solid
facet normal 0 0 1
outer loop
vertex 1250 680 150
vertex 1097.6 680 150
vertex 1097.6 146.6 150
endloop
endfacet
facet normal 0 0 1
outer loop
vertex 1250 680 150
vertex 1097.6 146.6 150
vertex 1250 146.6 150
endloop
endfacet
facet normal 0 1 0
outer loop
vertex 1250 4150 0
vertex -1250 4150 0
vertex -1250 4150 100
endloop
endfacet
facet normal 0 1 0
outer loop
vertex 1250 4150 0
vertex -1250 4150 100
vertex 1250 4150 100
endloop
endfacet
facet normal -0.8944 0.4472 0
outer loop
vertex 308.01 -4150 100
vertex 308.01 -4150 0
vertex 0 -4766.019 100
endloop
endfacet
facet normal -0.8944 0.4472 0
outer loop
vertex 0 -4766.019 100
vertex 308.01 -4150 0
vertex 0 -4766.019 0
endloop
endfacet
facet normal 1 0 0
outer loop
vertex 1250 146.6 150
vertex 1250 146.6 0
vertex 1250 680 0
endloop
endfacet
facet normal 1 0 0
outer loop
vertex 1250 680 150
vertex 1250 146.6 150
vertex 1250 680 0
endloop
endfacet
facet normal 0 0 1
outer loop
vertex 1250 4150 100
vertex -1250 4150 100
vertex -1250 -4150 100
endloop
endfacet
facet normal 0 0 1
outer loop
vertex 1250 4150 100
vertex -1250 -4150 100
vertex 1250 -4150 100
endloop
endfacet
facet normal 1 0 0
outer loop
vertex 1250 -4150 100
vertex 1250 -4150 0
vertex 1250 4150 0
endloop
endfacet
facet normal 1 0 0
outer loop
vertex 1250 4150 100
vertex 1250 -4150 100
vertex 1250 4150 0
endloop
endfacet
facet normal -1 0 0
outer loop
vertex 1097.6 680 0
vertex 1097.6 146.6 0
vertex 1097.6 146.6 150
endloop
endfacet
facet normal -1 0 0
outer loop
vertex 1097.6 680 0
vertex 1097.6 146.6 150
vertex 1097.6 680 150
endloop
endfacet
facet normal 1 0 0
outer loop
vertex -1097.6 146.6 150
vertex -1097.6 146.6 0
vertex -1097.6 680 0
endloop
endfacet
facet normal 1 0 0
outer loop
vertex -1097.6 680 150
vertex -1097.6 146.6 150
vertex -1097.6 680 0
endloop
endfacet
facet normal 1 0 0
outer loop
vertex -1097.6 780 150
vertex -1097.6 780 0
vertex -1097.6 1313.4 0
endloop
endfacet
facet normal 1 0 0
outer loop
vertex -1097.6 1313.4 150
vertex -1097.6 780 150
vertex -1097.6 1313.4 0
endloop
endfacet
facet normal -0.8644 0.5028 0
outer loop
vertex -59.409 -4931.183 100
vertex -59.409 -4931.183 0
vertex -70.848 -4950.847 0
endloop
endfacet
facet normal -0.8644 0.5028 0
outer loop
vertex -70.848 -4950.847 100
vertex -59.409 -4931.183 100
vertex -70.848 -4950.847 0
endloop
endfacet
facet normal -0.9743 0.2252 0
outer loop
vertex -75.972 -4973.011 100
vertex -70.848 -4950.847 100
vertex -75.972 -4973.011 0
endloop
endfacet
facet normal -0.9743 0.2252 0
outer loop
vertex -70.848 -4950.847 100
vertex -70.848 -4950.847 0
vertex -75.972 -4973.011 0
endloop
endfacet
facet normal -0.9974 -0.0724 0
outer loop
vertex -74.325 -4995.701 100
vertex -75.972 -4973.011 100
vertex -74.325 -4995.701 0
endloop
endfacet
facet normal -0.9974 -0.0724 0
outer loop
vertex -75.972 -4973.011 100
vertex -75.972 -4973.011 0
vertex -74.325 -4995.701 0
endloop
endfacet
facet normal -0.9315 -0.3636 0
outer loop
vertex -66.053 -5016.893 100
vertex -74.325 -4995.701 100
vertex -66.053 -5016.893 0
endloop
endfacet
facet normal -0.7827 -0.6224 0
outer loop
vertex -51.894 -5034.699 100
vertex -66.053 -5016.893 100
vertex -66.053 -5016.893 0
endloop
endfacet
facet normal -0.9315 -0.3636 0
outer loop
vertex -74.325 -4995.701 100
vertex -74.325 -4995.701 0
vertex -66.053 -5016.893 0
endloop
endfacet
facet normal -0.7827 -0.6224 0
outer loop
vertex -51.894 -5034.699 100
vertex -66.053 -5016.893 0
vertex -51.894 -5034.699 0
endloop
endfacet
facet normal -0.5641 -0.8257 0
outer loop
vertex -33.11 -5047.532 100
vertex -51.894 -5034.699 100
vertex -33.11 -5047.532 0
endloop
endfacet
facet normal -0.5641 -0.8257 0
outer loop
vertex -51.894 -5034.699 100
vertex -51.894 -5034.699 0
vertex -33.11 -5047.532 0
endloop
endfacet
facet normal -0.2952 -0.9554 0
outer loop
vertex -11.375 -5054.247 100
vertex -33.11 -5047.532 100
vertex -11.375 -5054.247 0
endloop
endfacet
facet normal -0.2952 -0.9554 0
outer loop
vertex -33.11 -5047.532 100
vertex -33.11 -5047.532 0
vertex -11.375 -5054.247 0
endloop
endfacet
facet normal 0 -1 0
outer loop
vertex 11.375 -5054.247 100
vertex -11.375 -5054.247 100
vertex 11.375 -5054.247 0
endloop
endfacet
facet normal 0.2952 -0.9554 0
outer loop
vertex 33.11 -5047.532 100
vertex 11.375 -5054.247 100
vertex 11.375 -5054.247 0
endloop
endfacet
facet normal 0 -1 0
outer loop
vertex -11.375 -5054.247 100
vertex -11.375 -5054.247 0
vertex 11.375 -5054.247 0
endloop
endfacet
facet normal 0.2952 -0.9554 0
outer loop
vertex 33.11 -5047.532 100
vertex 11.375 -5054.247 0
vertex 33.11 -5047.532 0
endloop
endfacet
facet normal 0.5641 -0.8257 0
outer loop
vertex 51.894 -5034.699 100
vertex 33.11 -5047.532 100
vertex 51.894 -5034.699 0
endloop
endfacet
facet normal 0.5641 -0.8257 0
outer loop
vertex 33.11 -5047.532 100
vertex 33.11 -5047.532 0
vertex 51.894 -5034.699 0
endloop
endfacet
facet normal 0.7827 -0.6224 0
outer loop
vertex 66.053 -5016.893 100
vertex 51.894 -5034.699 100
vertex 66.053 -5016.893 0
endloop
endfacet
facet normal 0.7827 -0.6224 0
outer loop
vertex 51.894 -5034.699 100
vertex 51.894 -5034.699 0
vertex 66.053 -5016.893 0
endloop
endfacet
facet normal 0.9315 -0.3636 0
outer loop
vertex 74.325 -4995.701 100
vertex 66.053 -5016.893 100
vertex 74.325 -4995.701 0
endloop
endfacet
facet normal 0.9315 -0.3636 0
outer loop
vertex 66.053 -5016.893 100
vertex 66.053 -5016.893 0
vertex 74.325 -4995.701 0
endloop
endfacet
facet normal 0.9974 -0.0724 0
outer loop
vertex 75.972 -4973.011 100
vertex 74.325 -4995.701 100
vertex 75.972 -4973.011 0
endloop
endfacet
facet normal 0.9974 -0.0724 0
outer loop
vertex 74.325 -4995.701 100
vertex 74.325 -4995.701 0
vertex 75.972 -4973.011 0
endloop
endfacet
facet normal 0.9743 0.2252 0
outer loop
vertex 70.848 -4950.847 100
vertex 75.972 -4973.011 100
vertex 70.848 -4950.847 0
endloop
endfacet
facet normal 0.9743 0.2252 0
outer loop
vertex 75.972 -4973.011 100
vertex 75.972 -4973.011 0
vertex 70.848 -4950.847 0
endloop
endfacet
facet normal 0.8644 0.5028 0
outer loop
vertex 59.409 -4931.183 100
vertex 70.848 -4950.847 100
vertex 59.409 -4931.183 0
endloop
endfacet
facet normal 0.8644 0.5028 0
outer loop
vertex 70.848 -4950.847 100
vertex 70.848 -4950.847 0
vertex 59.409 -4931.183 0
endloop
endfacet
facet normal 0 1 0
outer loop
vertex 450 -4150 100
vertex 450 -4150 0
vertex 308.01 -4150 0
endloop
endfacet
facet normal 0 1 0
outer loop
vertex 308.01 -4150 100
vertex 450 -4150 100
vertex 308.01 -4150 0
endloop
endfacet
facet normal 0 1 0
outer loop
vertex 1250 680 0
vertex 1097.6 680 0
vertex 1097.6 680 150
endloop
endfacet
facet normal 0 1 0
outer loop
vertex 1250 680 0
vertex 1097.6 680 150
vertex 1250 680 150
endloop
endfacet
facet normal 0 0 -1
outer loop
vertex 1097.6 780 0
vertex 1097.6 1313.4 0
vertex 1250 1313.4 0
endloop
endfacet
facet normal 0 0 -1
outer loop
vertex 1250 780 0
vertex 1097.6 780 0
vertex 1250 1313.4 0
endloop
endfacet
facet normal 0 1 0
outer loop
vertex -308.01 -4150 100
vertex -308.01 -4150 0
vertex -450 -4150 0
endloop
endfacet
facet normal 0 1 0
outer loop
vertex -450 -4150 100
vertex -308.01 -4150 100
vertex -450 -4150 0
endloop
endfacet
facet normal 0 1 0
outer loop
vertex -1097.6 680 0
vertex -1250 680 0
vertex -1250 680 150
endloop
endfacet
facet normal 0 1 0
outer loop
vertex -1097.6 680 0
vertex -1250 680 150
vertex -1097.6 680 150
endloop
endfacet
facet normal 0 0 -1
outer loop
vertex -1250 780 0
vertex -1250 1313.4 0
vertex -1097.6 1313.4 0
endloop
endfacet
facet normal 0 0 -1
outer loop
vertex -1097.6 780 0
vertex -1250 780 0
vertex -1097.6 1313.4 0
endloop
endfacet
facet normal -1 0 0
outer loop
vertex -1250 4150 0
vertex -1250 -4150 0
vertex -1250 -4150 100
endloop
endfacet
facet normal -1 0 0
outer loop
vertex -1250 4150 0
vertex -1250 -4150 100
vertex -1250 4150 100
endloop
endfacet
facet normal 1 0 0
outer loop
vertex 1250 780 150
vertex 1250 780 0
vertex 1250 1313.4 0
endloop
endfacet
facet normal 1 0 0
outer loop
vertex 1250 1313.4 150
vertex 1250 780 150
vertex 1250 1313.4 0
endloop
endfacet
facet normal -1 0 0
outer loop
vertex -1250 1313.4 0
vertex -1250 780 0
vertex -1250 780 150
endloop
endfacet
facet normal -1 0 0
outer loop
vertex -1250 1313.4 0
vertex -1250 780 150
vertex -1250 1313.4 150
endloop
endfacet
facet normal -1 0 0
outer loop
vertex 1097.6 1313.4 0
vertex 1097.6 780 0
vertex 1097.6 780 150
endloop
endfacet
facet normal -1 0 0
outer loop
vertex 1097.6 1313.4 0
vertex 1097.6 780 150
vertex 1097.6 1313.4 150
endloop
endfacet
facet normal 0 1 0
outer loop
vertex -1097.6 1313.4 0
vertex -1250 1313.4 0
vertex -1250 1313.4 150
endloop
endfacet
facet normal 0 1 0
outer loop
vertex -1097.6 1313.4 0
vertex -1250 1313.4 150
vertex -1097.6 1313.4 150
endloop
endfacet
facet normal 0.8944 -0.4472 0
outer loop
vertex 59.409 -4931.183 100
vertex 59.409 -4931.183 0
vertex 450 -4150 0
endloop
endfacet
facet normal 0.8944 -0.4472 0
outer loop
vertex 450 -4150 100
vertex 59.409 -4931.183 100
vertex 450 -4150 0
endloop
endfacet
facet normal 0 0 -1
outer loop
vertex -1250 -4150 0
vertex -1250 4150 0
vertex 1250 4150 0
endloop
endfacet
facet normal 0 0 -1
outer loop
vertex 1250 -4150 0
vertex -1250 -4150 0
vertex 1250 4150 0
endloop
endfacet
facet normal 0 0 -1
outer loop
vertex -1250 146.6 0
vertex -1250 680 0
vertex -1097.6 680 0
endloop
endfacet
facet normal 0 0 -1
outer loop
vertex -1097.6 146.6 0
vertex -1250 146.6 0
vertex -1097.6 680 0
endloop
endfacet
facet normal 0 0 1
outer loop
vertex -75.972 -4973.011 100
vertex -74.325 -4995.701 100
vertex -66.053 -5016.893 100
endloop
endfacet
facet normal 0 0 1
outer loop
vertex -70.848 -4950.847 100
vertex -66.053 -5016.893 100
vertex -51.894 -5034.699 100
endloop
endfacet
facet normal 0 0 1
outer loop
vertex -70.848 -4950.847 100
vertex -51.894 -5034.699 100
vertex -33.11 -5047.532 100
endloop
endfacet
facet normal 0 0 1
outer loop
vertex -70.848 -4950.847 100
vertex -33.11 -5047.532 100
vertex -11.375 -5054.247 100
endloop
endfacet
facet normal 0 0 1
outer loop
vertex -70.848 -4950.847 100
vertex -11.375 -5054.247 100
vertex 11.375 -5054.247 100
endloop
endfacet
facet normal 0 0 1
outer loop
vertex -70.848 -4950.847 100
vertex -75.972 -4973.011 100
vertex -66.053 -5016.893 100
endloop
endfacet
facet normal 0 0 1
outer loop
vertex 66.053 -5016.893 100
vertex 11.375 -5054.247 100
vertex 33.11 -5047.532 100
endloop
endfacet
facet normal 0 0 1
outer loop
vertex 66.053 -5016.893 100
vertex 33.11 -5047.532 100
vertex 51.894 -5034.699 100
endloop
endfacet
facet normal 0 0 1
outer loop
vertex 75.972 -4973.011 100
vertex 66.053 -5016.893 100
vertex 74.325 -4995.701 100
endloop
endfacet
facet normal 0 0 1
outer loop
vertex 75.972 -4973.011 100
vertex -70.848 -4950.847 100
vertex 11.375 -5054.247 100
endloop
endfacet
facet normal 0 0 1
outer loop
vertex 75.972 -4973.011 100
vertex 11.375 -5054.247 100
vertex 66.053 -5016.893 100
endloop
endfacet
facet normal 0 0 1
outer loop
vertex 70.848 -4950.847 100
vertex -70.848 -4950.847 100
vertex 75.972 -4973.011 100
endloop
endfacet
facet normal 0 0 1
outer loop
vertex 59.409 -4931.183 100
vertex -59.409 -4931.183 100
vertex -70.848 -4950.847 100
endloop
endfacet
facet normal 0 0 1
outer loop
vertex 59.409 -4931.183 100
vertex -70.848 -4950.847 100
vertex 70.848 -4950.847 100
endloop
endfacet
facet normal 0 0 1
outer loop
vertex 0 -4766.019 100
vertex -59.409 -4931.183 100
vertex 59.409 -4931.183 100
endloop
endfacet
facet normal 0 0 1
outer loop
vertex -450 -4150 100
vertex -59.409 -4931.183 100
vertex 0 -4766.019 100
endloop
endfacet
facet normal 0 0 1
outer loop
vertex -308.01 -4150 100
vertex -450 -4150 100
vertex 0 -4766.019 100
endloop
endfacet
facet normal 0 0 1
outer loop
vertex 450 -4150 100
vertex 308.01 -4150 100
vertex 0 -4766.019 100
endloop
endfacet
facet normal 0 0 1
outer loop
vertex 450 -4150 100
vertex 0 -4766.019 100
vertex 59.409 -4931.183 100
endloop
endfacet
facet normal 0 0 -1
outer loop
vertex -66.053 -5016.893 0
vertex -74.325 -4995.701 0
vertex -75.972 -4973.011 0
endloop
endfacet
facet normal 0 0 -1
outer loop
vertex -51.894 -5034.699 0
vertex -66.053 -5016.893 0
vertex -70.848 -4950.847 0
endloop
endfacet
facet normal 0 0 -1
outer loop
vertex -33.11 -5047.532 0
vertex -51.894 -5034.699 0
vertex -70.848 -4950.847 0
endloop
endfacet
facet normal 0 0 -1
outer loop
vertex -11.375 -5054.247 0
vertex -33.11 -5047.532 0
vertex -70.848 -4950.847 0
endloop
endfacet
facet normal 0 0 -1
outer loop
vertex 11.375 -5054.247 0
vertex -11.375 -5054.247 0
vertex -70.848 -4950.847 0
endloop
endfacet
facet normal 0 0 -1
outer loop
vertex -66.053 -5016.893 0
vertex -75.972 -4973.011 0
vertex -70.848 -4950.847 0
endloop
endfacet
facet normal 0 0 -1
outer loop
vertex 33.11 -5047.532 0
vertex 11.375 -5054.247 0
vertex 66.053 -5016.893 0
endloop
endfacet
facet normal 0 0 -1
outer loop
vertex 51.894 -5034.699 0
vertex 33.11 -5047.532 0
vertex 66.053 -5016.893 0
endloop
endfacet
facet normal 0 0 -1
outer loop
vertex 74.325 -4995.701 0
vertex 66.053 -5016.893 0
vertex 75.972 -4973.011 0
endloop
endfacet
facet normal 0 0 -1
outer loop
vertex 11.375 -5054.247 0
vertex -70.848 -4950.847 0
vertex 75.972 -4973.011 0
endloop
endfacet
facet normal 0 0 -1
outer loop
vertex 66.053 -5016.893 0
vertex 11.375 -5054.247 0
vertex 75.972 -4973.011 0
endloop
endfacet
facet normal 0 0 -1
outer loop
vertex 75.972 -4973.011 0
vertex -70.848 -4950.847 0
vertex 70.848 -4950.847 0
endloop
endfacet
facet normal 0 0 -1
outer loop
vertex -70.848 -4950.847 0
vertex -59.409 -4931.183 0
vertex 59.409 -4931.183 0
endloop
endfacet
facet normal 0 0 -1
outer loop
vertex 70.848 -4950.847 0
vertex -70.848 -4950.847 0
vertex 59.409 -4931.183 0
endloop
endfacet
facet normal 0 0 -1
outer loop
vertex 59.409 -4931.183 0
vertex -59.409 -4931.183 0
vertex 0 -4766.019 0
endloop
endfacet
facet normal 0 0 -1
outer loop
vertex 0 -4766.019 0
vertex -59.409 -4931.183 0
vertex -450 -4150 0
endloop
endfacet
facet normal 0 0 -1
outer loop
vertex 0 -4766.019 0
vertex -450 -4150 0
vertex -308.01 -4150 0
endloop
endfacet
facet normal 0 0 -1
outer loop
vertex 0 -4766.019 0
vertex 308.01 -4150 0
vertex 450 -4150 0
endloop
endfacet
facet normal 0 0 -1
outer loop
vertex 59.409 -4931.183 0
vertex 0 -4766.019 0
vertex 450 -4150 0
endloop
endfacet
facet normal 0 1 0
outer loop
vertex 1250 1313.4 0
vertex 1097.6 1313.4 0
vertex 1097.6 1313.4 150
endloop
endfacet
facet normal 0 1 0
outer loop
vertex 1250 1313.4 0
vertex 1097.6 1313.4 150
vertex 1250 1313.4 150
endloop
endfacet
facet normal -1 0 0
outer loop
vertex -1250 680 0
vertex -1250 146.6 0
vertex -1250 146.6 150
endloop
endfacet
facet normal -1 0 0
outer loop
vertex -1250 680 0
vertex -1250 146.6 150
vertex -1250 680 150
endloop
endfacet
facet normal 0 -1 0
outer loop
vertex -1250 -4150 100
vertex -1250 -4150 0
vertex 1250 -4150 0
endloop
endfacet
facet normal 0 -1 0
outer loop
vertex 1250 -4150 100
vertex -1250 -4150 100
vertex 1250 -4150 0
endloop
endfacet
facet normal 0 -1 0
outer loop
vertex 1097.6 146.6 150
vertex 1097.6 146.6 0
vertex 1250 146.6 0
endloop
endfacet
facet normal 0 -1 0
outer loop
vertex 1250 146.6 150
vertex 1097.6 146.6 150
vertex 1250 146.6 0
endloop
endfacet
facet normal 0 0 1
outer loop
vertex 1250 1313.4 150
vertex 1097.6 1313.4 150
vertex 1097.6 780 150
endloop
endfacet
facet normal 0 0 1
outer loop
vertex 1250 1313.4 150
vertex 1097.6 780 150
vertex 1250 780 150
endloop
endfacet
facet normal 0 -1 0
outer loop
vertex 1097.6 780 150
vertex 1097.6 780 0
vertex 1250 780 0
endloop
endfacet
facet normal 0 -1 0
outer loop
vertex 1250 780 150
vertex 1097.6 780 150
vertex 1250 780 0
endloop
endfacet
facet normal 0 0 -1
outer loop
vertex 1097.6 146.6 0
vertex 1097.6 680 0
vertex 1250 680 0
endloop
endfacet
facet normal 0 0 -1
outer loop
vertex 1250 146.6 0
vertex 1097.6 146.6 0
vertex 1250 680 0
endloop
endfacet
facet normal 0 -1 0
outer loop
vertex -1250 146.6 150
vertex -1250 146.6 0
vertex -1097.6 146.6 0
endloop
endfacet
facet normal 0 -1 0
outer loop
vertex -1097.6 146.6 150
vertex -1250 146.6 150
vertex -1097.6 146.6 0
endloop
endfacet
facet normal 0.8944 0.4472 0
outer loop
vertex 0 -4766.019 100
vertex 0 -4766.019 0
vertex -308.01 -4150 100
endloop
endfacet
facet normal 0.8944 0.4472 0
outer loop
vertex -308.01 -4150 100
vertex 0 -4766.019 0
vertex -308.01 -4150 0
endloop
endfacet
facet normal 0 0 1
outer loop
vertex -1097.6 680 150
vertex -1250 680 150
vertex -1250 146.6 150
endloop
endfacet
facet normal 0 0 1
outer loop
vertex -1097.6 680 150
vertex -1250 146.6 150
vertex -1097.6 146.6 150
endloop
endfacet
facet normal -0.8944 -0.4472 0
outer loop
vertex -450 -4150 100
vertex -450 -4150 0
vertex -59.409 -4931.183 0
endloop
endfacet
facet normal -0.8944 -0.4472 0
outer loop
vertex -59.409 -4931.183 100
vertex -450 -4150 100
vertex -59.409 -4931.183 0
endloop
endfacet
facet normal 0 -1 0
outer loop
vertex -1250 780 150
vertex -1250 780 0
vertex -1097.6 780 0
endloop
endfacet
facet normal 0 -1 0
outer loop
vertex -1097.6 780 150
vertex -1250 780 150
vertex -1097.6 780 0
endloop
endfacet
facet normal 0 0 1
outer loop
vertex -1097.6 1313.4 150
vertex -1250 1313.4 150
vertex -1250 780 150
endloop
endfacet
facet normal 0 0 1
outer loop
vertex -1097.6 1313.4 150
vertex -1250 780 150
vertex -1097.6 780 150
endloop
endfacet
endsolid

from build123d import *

# Parameters (mm, degrees)
F0_W     = 2500
F0_H     = 8300
F1_DEPTH = 100
F3_DEPTH = 100
F4_W     = 152.4
F4_H     = 533.4
F5_DEPTH = 150


with BuildPart() as f1:
    # F0 (on Top) → F1 (new body)
    with BuildSketch(Plane.XY):
        Rectangle(F0_W, F0_H)
    extrude(amount=F1_DEPTH)


with BuildPart() as f3:
    # F2 (on Top) → F3 (new body)
    with BuildSketch(Plane.XY):
        with BuildLine():
            Line((-308.0096834288, -4150), (-450, -4150))
            Line((-450, -4150), (-59.4087300624, -4931.1825398752))
            ThreePointArc((-59.4087300624, -4931.1825398752), (0, -4902.7009094238), (59.4087300624, -4931.1825398752))
            Line((59.4087300624, -4931.1825398752), (450, -4150))
            Line((450, -4150), (308.0096834288, -4150))
            Line((308.0096834288, -4150), (0, -4766.0193668575))
            Line((0, -4766.0193668575), (-308.0096834288, -4150))
        make_face()
        with BuildLine():
            ThreePointArc((59.4087300624, -4931.1825398752), (0, -4902.7009094238), (-59.4087300624, -4931.1825398752))
            Line((-59.4087300624, -4931.1825398752), (0, -5050))
            Line((0, -5050), (59.4087300624, -4931.1825398752))
        make_face()
        with BuildLine():
            Line((0, -5050), (-59.4087300624, -4931.1825398752))
            ThreePointArc((-59.4087300624, -4931.1825398752), (-25.2932280388, -5050.7806187678), (76.2, -4978.9009094238))
            ThreePointArc((76.2, -4978.9009094238), (71.879709344, -4953.607681385), (59.4087300624, -4931.1825398752))
            Line((59.4087300624, -4931.1825398752), (0, -5050))
        make_face()
    extrude(amount=F3_DEPTH)


with BuildPart() as f5:
    # F4 (on Top) → F5 (new body)
    with BuildSketch(Plane.XY):
        with Locations((-1173.8, 1046.7)):
            Rectangle(F4_W, F4_H)
    extrude(amount=F5_DEPTH)


with BuildPart() as f5b:
    # F4 (on Top) → F5, piece 2 (new body)
    with BuildSketch(Plane.XY):
        with Locations((-1173.8, 413.3)):
            Rectangle(F4_W, F4_H)
    extrude(amount=F5_DEPTH)


with BuildPart() as f5c:
    # F4 (on Top) → F5, piece 3 (new body)
    with BuildSketch(Plane.XY):
        with Locations((1173.8, 413.3)):
            Rectangle(F4_W, F4_H)
    extrude(amount=F5_DEPTH)


with BuildPart() as f5d:
    # F4 (on Top) → F5, piece 4 (new body)
    with BuildSketch(Plane.XY):
        with Locations((1173.8, 1046.7)):
            Rectangle(F4_W, F4_H)
    extrude(amount=F5_DEPTH)


solid = Compound([f1.part, f3.part, f5.part, f5b.part, f5c.part, f5d.part])
